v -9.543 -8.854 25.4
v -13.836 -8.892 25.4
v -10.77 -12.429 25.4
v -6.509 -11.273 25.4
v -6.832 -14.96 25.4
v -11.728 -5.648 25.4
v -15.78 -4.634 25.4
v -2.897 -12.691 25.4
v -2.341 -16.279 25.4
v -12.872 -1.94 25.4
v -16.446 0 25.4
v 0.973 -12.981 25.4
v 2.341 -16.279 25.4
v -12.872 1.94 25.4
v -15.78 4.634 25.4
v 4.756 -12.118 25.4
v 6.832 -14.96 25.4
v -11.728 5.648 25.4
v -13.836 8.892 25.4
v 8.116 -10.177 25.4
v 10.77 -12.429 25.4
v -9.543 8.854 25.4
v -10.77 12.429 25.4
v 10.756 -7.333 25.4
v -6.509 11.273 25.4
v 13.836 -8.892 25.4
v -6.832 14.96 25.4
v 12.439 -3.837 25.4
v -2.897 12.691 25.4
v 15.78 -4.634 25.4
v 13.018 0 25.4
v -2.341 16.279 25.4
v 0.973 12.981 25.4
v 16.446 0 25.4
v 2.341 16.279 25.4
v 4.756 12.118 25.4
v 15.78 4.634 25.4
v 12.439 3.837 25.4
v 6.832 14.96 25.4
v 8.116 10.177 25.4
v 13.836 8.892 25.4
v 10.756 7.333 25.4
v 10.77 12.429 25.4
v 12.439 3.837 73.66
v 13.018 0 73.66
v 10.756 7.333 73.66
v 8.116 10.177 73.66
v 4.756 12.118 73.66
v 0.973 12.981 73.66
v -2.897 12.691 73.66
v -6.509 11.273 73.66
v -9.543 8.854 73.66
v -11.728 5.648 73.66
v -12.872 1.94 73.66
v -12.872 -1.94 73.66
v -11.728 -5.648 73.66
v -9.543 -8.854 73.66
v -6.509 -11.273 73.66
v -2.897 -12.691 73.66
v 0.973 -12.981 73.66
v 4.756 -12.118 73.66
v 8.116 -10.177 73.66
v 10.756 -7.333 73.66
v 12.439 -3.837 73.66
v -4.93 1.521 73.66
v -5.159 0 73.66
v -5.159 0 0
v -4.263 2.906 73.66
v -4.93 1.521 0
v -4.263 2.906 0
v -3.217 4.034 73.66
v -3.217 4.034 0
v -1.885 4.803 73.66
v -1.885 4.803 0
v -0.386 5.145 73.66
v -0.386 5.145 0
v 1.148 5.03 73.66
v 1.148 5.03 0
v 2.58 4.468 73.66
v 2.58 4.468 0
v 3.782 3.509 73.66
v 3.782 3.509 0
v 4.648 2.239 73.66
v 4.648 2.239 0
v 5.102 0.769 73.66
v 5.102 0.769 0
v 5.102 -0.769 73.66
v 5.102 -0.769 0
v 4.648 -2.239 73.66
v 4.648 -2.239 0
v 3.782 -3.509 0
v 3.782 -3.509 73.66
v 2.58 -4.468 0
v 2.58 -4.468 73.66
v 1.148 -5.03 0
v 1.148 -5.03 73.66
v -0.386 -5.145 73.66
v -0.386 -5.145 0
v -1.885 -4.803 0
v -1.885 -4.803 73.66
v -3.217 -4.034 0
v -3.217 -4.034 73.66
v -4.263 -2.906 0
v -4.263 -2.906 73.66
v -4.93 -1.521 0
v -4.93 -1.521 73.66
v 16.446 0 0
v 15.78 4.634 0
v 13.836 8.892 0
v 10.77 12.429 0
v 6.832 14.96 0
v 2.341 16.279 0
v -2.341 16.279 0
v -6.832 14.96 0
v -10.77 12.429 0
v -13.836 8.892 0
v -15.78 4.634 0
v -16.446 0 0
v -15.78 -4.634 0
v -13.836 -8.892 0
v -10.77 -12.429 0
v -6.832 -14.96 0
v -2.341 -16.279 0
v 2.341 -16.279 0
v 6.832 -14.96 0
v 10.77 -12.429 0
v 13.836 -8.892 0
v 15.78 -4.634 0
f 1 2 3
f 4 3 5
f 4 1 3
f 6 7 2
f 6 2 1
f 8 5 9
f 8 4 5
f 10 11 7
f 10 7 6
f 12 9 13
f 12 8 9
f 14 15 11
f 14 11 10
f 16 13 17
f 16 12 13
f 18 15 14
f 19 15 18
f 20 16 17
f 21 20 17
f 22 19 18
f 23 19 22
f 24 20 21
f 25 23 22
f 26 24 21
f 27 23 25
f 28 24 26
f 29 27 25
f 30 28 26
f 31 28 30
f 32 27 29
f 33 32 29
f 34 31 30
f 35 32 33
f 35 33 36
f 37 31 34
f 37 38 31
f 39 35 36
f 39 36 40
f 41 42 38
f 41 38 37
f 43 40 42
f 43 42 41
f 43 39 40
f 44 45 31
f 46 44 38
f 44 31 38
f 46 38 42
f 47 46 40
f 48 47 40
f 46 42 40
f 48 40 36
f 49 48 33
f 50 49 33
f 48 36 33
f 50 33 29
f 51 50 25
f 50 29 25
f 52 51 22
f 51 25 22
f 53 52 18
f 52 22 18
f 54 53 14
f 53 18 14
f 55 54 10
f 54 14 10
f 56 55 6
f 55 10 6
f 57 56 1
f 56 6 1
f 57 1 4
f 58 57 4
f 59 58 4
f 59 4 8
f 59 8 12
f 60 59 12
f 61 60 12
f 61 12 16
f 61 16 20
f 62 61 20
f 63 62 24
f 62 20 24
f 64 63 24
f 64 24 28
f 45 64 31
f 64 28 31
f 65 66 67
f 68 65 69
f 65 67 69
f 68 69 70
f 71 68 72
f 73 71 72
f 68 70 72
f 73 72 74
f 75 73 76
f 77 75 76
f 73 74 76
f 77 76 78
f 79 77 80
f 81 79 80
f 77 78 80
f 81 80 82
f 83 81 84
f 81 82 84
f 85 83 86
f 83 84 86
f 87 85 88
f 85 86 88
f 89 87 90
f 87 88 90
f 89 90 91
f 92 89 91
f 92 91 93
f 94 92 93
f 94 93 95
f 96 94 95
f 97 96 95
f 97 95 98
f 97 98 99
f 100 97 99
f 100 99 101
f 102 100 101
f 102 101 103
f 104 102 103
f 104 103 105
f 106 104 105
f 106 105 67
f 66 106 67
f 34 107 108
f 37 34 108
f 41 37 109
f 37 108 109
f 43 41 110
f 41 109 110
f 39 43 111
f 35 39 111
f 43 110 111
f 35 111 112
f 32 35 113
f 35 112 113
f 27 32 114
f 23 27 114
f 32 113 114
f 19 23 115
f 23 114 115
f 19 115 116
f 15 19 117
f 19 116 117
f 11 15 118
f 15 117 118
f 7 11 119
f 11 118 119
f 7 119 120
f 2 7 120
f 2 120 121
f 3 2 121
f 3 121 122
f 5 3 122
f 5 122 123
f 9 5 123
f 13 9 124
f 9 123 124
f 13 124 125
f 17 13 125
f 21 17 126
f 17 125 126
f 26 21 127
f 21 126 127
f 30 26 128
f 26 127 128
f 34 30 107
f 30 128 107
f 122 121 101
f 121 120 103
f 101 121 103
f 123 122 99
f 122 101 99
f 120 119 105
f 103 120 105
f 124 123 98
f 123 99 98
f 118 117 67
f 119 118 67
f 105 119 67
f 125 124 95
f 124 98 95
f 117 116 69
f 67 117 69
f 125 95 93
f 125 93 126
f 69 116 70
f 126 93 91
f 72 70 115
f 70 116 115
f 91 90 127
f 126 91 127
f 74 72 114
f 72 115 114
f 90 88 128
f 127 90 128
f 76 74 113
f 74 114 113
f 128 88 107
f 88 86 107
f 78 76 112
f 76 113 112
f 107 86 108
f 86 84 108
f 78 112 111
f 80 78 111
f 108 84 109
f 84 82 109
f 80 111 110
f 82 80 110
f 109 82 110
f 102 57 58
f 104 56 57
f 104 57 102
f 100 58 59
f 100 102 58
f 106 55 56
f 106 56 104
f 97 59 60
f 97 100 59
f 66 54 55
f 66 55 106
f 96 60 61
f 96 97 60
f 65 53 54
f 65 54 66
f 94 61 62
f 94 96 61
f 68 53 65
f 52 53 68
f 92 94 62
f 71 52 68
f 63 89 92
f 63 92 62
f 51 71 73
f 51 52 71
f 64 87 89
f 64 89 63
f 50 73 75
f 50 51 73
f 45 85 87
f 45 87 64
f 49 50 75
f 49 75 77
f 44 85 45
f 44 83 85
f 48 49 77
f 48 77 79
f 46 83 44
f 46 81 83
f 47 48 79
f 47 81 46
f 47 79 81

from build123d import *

# Parameters (mm, degrees)
F0_R     = 16.4465
F1_DEPTH = 25.4
F2_R     = 13.0175
F3_DEPTH = 48.26
F5_D     = 10.31875


with BuildPart() as f1:
    # F0 (on Top) → F1 (new body)
    with BuildSketch(Plane.XY):
        Circle(F0_R)
    extrude(amount=F1_DEPTH)

    # F2 (on face) → F3 (join)
    with BuildSketch(Plane.XY.offset(25.4)):
        Circle(F2_R)
    extrude(amount=F3_DEPTH)

    # F5 (through all)
    with Locations(Plane.XY.offset(73.66)):
        with Locations((0, 0)):
            Hole(F5_D / 2)


solid = f1.part
